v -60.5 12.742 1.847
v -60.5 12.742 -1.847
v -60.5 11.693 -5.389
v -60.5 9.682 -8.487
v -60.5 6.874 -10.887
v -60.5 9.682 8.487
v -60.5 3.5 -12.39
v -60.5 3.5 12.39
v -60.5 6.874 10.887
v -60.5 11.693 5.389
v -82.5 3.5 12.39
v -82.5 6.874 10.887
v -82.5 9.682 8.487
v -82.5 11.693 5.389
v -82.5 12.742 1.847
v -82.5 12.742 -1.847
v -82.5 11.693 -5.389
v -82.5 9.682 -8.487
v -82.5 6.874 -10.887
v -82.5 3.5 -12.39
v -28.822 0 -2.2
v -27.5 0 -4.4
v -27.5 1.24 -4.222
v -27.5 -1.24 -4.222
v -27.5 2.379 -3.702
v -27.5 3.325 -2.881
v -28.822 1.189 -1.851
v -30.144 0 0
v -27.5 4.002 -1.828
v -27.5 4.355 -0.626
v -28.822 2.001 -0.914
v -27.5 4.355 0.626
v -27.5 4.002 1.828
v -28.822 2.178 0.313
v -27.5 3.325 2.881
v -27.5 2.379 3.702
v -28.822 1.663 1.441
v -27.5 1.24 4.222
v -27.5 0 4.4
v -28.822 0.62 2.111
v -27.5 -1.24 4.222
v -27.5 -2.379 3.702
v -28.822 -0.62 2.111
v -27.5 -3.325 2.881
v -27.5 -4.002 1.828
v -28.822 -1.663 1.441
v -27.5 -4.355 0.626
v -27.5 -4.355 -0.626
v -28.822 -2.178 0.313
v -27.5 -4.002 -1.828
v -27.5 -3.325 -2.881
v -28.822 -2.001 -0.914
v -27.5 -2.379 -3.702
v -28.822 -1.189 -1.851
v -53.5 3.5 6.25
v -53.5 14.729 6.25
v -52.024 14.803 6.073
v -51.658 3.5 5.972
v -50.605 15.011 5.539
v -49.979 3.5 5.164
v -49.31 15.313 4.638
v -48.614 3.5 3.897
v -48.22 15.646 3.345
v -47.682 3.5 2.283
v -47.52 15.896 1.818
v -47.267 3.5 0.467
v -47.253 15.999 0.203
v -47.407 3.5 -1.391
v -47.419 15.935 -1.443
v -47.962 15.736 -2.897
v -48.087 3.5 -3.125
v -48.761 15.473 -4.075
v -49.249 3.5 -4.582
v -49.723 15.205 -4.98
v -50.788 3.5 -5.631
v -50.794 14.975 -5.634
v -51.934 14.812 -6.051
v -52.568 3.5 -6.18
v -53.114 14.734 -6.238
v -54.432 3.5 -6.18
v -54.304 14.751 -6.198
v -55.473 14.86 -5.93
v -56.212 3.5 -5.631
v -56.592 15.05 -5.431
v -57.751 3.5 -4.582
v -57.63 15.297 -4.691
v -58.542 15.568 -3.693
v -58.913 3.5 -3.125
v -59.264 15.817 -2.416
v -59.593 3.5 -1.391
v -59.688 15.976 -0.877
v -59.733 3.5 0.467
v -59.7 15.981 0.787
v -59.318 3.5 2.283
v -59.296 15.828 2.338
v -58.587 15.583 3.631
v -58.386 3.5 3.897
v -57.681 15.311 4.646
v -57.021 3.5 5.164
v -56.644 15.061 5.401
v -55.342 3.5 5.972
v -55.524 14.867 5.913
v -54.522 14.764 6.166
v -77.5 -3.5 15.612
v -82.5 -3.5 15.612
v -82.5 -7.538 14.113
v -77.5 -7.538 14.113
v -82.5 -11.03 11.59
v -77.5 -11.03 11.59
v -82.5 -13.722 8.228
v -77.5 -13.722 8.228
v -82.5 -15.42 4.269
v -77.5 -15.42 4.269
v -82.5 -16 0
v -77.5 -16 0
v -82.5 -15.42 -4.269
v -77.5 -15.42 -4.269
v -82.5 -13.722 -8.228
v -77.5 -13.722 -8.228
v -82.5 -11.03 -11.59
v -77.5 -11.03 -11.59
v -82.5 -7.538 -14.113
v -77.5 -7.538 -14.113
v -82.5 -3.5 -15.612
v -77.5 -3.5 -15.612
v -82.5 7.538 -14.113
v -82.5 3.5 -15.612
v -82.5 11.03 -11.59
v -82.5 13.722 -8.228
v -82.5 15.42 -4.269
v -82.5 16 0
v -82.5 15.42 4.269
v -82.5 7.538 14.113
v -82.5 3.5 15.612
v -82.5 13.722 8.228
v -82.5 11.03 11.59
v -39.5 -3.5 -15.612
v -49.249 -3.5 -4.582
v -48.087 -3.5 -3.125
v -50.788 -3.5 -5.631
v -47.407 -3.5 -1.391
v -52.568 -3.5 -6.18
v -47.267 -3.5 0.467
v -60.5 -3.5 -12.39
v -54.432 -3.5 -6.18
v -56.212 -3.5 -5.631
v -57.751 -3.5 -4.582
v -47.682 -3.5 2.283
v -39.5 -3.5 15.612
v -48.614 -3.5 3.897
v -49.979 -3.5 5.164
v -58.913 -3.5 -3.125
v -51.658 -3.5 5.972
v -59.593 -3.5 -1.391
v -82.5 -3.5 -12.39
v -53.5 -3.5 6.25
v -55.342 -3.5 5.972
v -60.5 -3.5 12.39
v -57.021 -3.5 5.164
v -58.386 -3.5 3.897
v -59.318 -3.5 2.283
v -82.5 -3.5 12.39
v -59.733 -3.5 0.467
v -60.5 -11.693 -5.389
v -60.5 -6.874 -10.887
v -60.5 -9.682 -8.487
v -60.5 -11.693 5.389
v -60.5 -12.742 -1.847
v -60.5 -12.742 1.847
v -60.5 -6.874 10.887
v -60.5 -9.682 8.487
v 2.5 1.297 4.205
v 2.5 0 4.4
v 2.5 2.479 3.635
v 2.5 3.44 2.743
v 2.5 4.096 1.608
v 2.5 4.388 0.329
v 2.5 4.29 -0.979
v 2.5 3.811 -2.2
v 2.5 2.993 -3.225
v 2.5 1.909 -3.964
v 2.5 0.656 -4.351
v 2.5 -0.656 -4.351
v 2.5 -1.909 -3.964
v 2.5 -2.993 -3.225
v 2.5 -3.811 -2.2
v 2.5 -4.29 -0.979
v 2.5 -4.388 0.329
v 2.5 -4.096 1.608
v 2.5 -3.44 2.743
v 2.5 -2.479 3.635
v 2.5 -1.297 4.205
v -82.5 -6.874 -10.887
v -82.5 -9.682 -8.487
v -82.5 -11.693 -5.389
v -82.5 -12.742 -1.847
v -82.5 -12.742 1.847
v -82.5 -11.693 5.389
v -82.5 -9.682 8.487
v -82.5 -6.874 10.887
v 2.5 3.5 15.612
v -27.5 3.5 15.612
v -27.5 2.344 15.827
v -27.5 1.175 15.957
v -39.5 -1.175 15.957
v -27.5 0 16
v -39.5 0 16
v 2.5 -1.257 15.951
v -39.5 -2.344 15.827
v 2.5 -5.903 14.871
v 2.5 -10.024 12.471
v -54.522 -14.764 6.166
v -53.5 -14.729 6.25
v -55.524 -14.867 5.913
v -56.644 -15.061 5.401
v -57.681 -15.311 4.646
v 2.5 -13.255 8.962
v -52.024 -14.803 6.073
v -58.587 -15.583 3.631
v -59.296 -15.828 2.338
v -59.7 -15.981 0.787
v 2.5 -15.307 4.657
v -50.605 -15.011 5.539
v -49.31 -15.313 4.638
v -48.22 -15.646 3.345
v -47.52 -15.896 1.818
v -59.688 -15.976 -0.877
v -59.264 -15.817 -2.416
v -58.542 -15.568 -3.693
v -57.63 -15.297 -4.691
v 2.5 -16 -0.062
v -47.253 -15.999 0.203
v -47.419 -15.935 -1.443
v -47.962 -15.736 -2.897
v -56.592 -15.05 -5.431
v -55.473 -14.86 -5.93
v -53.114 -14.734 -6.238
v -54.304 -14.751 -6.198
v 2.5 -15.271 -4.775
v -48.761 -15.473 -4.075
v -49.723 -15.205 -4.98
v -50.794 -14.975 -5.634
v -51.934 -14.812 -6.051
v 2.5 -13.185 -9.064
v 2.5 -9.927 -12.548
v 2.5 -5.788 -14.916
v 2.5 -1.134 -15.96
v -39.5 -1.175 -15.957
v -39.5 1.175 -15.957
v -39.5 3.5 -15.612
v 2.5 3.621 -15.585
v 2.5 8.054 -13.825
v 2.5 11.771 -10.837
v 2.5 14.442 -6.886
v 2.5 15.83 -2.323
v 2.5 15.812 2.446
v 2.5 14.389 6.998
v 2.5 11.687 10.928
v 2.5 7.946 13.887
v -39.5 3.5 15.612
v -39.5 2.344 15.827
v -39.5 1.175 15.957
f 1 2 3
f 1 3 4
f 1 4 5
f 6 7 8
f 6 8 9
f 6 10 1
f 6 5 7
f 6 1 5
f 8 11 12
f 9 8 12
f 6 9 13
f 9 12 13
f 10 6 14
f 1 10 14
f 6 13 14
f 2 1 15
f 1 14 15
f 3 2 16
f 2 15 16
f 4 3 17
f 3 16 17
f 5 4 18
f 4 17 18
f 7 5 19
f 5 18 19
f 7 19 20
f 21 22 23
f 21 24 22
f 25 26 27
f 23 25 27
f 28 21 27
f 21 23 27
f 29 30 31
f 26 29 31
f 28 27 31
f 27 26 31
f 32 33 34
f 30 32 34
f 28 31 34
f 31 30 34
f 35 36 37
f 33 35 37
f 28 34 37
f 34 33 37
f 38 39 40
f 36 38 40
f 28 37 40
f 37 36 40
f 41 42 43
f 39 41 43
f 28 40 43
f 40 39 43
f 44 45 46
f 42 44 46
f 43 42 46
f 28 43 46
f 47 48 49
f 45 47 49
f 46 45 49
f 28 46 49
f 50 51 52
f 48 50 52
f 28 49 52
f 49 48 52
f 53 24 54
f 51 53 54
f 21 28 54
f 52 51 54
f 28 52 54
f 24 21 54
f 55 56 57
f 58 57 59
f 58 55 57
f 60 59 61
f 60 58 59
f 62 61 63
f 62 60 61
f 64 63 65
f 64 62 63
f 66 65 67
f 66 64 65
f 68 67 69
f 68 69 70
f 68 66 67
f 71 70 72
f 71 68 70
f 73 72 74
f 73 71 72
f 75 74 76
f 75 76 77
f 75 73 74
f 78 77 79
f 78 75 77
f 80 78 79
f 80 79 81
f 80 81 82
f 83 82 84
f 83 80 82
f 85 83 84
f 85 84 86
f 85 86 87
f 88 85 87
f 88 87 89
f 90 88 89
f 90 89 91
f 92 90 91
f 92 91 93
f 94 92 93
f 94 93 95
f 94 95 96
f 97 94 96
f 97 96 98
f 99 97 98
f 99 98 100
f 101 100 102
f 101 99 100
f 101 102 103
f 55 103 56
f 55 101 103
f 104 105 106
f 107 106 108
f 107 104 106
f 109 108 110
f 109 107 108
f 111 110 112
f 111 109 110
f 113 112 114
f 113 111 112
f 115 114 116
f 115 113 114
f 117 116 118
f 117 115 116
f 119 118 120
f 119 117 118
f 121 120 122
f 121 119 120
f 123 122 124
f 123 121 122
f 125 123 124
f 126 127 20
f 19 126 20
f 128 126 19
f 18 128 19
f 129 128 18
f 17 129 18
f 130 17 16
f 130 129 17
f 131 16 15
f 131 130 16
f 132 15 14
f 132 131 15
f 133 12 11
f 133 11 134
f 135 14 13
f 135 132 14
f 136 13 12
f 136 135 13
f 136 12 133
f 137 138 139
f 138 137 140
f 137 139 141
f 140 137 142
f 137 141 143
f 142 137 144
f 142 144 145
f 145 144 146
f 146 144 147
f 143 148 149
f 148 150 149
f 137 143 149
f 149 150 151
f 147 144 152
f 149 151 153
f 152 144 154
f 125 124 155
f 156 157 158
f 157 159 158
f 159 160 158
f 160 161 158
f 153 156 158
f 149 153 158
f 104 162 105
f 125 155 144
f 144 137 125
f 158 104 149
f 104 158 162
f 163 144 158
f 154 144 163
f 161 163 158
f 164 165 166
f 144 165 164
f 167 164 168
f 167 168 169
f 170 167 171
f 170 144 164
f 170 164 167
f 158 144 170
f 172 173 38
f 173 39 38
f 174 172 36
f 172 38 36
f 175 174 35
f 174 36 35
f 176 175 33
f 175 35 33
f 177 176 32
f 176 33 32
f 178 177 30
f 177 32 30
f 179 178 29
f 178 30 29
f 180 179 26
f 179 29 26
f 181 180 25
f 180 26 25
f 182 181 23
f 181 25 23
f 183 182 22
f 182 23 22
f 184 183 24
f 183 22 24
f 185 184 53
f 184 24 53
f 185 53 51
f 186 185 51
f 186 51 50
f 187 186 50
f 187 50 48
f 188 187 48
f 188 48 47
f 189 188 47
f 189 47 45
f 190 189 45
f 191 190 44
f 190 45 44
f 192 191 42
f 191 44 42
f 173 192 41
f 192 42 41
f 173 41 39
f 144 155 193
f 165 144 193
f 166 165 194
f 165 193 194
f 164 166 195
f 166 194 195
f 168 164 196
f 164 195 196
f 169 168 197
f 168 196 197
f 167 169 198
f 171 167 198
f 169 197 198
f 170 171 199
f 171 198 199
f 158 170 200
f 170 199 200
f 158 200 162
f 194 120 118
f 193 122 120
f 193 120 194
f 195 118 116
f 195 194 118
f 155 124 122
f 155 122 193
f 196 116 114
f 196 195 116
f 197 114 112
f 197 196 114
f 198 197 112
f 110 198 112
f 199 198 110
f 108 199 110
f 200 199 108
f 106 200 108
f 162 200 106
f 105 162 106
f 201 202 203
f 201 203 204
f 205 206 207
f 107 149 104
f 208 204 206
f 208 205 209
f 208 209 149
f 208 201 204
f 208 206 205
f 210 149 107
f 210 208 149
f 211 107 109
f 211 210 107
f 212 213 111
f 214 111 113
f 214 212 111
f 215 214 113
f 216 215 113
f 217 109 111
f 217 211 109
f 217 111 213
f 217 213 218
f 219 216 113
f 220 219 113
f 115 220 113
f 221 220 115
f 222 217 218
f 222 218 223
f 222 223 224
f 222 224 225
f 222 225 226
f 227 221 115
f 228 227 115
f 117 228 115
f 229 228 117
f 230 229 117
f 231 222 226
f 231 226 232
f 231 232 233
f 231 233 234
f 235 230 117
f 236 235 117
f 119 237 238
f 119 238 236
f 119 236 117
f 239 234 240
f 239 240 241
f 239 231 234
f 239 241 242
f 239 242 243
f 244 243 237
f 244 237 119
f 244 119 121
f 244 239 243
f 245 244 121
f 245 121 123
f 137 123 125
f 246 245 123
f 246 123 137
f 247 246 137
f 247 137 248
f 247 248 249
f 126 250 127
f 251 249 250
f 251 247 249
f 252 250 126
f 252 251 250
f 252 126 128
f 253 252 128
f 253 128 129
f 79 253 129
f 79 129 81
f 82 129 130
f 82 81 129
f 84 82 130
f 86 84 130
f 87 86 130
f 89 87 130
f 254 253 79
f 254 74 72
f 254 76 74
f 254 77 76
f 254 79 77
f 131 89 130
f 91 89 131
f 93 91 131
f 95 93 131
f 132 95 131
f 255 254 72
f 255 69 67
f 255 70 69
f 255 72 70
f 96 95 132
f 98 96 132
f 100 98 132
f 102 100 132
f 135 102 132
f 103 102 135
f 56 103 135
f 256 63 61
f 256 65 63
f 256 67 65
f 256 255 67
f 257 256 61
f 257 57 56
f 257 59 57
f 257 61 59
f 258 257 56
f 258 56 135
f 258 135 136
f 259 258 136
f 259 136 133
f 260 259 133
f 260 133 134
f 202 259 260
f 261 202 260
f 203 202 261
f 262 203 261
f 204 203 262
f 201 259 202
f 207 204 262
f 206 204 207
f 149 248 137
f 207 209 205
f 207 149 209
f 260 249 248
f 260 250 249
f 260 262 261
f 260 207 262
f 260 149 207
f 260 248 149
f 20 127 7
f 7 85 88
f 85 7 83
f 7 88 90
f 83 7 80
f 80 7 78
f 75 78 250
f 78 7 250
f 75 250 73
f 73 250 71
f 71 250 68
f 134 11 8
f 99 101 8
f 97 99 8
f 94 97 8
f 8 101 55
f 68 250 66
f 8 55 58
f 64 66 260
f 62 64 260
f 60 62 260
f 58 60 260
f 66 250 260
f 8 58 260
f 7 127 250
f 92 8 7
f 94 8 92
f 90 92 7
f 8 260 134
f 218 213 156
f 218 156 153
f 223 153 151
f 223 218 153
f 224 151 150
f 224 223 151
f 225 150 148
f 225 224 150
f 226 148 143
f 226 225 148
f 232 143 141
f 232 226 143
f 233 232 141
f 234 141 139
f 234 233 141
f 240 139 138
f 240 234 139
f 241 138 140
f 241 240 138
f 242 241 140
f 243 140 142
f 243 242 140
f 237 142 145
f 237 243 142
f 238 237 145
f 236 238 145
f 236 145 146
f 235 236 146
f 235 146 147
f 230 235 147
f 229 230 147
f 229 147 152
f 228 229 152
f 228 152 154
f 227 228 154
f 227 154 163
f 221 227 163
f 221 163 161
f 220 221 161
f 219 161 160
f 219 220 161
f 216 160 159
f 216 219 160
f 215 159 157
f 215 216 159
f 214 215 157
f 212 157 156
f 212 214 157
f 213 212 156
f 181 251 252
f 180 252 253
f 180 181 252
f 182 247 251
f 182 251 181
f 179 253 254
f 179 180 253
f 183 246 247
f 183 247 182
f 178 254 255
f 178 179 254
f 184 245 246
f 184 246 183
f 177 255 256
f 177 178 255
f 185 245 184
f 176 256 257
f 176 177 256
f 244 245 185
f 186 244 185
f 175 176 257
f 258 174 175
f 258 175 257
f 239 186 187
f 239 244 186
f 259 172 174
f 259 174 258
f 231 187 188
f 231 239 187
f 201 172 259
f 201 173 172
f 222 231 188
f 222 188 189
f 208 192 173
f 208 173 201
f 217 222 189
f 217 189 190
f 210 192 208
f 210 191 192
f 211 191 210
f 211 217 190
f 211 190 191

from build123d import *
from build123d.topology import SkipClean

# Parameters (mm, degrees)
SKETCH1_W                   = 155
SKETCH1_H                   = 16
CUT_EXTRUDE1_DEPTH          = 81.735679845
CUT_EXTRUDE1_DEPTH_BACK     = 81.735679845
SKETCH2_R                   = 6.25
SKETCH4_W                   = 50
SKETCH4_H                   = 7
CUT_EXTRUDE3_DEPTH          = 38
BOSS_EXTRUDE1_DEPTH         = 5
SKETCH24_R                  = 12.875
CUT_EXTRUDE12_DEPTH         = 22
SKETCH12_R                  = 16
SKETCH12_R_2                = 10
CUT_EXTRUDE6_DEPTH          = 35
SKETCH13_R                  = 6
BOSS_EXTRUDE2_DEPTH         = 15
CHAMFER2_SIZE               = 0.5
SKETCH17_R                  = 16
SKETCH17_R_2                = 12.5
CUT_EXTRUDE9_DEPTH          = 75
SKETCH14_W                  = 1
SKETCH14_H                  = 1
BOSS_EXTRUDE3_DEPTH         = 35
CIRPATTERN1_COUNT           = 32
CUT_EXTRUDE10_DEPTH         = 96.227359548
CUT_EXTRUDE10_DEPTH_BACK    = 96.227359548
SKETCH20_W                  = 129.677908588
SKETCH20_H                  = 32
BOSS_EXTRUDE4_START         = 30
SKETCH22_R                  = 16
BOSS_EXTRUDE4_DEPTH         = 30
M10X1_25_TAPPED_HOLE1_D     = 8.8
M10X1_25_TAPPED_HOLE1_DEPTH = 30
M10X1_25_TAPPED_HOLE1_TIP   = 2.643786724


with BuildPart() as part:
    # Sketch1 → Revolve1 (revolve)
    with BuildSketch(Plane(origin=(0, 0, 0), x_dir=(1, 0, 0), z_dir=(0, 1, 0))):
        with Locations((0, -8)):
            Rectangle(SKETCH1_W, SKETCH1_H)
    revolve(axis=Axis((-77.5, 0, 0), (1, 0, 0)))

    # Sketch2 → Cut-Extrude1 (cut, two sides: drawn at the far end of the back side and taken through both)
    with BuildSketch(Plane(origin=(0, 0, 0), x_dir=(1, 0, 0), z_dir=(0, 1, 0)).offset(-CUT_EXTRUDE1_DEPTH_BACK)):
        with Locations(Location((-53.5, 0, 0), (0, 0, 270))):
            Circle(SKETCH2_R)
    extrude(amount=CUT_EXTRUDE1_DEPTH + CUT_EXTRUDE1_DEPTH_BACK, mode=Mode.SUBTRACT)

    # Sketch4 → Cut-Extrude3 (cut)
    with BuildSketch(Plane.ZY.offset(77.5)):
        Rectangle(SKETCH4_W, SKETCH4_H)
    extrude(amount=-CUT_EXTRUDE3_DEPTH, mode=Mode.SUBTRACT)

    # Sketch6 → Boss-Extrude1 (add)
    with BuildSketch(Plane.ZY.offset(77.5)):
        with BuildLine():
            Line((-15.612494996, 3.5), (15.612494996, 3.5))
            ThreePointArc((15.612494996, 3.5), (0, 16), (-15.612494996, 3.5))
        make_face()
        with BuildLine():
            Line((15.612494996, -3.5), (-15.612494996, -3.5))
            ThreePointArc((-15.612494996, -3.5), (0, -16), (15.612494996, -3.5))
        make_face()
    extrude(amount=BOSS_EXTRUDE1_DEPTH)

    # Sketch24 → Cut-Extrude12 (cut)
    with BuildSketch(Plane.ZY.offset(82.5)):
        Circle(SKETCH24_R)
    extrude(amount=-CUT_EXTRUDE12_DEPTH, mode=Mode.SUBTRACT)

    # Sketch12 → Cut-Extrude6 (cut)
    with BuildSketch(Plane(origin=(77.5, 0, 0), x_dir=(0, 0, -1), z_dir=(1, 0, 0))):
        with Locations(Location((0, 0, 0), (0, 0, 167.364374907))):
            Circle(SKETCH12_R)
        Circle(SKETCH12_R_2, mode=Mode.SUBTRACT)
    extrude(amount=-CUT_EXTRUDE6_DEPTH, mode=Mode.SUBTRACT)

    # Sketch13 → Boss-Extrude2 (add)
    with BuildSketch(Plane(origin=(77.5, 0, 0), x_dir=(0, 0, -1), z_dir=(1, 0, 0))):
        Circle(SKETCH13_R)
    extrude(amount=BOSS_EXTRUDE2_DEPTH)

    # Chamfer2
    chamfer2_edges = [part.edges().sort_by_distance(p)[0] for p in [
        (92.5, 0, 6),
    ]]
    chamfer(chamfer2_edges, length=CHAMFER2_SIZE)

    # Sketch17 → Cut-Extrude9 (cut)
    with BuildSketch(Plane(origin=(47.5, 0, 0), x_dir=(0, 0, -1), z_dir=(1, 0, 0))):
        with Locations(Location((0, 0, 0), (0, 0, 167.364374907))):
            Circle(SKETCH17_R)
        Circle(SKETCH17_R_2, mode=Mode.SUBTRACT)
    extrude(amount=-CUT_EXTRUDE9_DEPTH, mode=Mode.SUBTRACT)

    # Sketch14 → Boss-Extrude3 (add)
    with SkipClean():  # the faces are left unmerged after this step: merging them gives an invalid solid
        with BuildSketch(Plane(origin=(77.5, 0, 0), x_dir=(0, 0, -1), z_dir=(1, 0, 0))):
            with Locations((0, 10)):
                Rectangle(SKETCH14_W, SKETCH14_H)
        boss_extrude3 = extrude(amount=-BOSS_EXTRUDE3_DEPTH)

    # CirPattern1: Boss-Extrude3 ×32 about axis
    with SkipClean():  # the faces are left unmerged after this step: merging them gives an invalid solid
        cirpattern1_axis = Axis((0, 0, 0), (1, 0, 0))
        for i in range(1, CIRPATTERN1_COUNT):
            add(boss_extrude3.rotate(cirpattern1_axis, i * 360 / CIRPATTERN1_COUNT))

    # Sketch20 → Cut-Extrude10 (cut, two sides: drawn at the far end of the back side and taken through both)
    with BuildSketch(Plane(origin=(0, 0, 0), x_dir=(1, 0, 0), z_dir=(0, 1, 0)).offset(-CUT_EXTRUDE10_DEPTH_BACK)):
        with Locations((37.338954294, 0)):
            Rectangle(SKETCH20_W, SKETCH20_H)
    extrude(amount=CUT_EXTRUDE10_DEPTH + CUT_EXTRUDE10_DEPTH_BACK, mode=Mode.SUBTRACT)

    # Sketch22 → Boss-Extrude4 (add)
    with SkipClean():  # the faces are left unmerged after this step: merging them gives an invalid solid
        with BuildSketch(Plane(origin=(-27.5, 0, 0), x_dir=(0, 0, -1), z_dir=(1, 0, 0)).offset(BOSS_EXTRUDE4_START)):
            with Locations(Location((0, 0, 0), (0, 0, 167.364374907))):
                Circle(SKETCH22_R)
        extrude(amount=-BOSS_EXTRUDE4_DEPTH)

    # M10x1.25 Tapped Hole1
    with Locations(Plane(origin=(2.5, 0, 0), x_dir=(0, 0, -1), z_dir=(1, 0, 0))):
        with Locations((0, 0)):
            Hole(M10X1_25_TAPPED_HOLE1_D / 2, depth=M10X1_25_TAPPED_HOLE1_DEPTH)
            with Locations((0, 0, -(M10X1_25_TAPPED_HOLE1_DEPTH + M10X1_25_TAPPED_HOLE1_TIP / 2))):  # 118° drill point
                Cone(0, M10X1_25_TAPPED_HOLE1_D / 2, M10X1_25_TAPPED_HOLE1_TIP, mode=Mode.SUBTRACT)


solid = part.part
